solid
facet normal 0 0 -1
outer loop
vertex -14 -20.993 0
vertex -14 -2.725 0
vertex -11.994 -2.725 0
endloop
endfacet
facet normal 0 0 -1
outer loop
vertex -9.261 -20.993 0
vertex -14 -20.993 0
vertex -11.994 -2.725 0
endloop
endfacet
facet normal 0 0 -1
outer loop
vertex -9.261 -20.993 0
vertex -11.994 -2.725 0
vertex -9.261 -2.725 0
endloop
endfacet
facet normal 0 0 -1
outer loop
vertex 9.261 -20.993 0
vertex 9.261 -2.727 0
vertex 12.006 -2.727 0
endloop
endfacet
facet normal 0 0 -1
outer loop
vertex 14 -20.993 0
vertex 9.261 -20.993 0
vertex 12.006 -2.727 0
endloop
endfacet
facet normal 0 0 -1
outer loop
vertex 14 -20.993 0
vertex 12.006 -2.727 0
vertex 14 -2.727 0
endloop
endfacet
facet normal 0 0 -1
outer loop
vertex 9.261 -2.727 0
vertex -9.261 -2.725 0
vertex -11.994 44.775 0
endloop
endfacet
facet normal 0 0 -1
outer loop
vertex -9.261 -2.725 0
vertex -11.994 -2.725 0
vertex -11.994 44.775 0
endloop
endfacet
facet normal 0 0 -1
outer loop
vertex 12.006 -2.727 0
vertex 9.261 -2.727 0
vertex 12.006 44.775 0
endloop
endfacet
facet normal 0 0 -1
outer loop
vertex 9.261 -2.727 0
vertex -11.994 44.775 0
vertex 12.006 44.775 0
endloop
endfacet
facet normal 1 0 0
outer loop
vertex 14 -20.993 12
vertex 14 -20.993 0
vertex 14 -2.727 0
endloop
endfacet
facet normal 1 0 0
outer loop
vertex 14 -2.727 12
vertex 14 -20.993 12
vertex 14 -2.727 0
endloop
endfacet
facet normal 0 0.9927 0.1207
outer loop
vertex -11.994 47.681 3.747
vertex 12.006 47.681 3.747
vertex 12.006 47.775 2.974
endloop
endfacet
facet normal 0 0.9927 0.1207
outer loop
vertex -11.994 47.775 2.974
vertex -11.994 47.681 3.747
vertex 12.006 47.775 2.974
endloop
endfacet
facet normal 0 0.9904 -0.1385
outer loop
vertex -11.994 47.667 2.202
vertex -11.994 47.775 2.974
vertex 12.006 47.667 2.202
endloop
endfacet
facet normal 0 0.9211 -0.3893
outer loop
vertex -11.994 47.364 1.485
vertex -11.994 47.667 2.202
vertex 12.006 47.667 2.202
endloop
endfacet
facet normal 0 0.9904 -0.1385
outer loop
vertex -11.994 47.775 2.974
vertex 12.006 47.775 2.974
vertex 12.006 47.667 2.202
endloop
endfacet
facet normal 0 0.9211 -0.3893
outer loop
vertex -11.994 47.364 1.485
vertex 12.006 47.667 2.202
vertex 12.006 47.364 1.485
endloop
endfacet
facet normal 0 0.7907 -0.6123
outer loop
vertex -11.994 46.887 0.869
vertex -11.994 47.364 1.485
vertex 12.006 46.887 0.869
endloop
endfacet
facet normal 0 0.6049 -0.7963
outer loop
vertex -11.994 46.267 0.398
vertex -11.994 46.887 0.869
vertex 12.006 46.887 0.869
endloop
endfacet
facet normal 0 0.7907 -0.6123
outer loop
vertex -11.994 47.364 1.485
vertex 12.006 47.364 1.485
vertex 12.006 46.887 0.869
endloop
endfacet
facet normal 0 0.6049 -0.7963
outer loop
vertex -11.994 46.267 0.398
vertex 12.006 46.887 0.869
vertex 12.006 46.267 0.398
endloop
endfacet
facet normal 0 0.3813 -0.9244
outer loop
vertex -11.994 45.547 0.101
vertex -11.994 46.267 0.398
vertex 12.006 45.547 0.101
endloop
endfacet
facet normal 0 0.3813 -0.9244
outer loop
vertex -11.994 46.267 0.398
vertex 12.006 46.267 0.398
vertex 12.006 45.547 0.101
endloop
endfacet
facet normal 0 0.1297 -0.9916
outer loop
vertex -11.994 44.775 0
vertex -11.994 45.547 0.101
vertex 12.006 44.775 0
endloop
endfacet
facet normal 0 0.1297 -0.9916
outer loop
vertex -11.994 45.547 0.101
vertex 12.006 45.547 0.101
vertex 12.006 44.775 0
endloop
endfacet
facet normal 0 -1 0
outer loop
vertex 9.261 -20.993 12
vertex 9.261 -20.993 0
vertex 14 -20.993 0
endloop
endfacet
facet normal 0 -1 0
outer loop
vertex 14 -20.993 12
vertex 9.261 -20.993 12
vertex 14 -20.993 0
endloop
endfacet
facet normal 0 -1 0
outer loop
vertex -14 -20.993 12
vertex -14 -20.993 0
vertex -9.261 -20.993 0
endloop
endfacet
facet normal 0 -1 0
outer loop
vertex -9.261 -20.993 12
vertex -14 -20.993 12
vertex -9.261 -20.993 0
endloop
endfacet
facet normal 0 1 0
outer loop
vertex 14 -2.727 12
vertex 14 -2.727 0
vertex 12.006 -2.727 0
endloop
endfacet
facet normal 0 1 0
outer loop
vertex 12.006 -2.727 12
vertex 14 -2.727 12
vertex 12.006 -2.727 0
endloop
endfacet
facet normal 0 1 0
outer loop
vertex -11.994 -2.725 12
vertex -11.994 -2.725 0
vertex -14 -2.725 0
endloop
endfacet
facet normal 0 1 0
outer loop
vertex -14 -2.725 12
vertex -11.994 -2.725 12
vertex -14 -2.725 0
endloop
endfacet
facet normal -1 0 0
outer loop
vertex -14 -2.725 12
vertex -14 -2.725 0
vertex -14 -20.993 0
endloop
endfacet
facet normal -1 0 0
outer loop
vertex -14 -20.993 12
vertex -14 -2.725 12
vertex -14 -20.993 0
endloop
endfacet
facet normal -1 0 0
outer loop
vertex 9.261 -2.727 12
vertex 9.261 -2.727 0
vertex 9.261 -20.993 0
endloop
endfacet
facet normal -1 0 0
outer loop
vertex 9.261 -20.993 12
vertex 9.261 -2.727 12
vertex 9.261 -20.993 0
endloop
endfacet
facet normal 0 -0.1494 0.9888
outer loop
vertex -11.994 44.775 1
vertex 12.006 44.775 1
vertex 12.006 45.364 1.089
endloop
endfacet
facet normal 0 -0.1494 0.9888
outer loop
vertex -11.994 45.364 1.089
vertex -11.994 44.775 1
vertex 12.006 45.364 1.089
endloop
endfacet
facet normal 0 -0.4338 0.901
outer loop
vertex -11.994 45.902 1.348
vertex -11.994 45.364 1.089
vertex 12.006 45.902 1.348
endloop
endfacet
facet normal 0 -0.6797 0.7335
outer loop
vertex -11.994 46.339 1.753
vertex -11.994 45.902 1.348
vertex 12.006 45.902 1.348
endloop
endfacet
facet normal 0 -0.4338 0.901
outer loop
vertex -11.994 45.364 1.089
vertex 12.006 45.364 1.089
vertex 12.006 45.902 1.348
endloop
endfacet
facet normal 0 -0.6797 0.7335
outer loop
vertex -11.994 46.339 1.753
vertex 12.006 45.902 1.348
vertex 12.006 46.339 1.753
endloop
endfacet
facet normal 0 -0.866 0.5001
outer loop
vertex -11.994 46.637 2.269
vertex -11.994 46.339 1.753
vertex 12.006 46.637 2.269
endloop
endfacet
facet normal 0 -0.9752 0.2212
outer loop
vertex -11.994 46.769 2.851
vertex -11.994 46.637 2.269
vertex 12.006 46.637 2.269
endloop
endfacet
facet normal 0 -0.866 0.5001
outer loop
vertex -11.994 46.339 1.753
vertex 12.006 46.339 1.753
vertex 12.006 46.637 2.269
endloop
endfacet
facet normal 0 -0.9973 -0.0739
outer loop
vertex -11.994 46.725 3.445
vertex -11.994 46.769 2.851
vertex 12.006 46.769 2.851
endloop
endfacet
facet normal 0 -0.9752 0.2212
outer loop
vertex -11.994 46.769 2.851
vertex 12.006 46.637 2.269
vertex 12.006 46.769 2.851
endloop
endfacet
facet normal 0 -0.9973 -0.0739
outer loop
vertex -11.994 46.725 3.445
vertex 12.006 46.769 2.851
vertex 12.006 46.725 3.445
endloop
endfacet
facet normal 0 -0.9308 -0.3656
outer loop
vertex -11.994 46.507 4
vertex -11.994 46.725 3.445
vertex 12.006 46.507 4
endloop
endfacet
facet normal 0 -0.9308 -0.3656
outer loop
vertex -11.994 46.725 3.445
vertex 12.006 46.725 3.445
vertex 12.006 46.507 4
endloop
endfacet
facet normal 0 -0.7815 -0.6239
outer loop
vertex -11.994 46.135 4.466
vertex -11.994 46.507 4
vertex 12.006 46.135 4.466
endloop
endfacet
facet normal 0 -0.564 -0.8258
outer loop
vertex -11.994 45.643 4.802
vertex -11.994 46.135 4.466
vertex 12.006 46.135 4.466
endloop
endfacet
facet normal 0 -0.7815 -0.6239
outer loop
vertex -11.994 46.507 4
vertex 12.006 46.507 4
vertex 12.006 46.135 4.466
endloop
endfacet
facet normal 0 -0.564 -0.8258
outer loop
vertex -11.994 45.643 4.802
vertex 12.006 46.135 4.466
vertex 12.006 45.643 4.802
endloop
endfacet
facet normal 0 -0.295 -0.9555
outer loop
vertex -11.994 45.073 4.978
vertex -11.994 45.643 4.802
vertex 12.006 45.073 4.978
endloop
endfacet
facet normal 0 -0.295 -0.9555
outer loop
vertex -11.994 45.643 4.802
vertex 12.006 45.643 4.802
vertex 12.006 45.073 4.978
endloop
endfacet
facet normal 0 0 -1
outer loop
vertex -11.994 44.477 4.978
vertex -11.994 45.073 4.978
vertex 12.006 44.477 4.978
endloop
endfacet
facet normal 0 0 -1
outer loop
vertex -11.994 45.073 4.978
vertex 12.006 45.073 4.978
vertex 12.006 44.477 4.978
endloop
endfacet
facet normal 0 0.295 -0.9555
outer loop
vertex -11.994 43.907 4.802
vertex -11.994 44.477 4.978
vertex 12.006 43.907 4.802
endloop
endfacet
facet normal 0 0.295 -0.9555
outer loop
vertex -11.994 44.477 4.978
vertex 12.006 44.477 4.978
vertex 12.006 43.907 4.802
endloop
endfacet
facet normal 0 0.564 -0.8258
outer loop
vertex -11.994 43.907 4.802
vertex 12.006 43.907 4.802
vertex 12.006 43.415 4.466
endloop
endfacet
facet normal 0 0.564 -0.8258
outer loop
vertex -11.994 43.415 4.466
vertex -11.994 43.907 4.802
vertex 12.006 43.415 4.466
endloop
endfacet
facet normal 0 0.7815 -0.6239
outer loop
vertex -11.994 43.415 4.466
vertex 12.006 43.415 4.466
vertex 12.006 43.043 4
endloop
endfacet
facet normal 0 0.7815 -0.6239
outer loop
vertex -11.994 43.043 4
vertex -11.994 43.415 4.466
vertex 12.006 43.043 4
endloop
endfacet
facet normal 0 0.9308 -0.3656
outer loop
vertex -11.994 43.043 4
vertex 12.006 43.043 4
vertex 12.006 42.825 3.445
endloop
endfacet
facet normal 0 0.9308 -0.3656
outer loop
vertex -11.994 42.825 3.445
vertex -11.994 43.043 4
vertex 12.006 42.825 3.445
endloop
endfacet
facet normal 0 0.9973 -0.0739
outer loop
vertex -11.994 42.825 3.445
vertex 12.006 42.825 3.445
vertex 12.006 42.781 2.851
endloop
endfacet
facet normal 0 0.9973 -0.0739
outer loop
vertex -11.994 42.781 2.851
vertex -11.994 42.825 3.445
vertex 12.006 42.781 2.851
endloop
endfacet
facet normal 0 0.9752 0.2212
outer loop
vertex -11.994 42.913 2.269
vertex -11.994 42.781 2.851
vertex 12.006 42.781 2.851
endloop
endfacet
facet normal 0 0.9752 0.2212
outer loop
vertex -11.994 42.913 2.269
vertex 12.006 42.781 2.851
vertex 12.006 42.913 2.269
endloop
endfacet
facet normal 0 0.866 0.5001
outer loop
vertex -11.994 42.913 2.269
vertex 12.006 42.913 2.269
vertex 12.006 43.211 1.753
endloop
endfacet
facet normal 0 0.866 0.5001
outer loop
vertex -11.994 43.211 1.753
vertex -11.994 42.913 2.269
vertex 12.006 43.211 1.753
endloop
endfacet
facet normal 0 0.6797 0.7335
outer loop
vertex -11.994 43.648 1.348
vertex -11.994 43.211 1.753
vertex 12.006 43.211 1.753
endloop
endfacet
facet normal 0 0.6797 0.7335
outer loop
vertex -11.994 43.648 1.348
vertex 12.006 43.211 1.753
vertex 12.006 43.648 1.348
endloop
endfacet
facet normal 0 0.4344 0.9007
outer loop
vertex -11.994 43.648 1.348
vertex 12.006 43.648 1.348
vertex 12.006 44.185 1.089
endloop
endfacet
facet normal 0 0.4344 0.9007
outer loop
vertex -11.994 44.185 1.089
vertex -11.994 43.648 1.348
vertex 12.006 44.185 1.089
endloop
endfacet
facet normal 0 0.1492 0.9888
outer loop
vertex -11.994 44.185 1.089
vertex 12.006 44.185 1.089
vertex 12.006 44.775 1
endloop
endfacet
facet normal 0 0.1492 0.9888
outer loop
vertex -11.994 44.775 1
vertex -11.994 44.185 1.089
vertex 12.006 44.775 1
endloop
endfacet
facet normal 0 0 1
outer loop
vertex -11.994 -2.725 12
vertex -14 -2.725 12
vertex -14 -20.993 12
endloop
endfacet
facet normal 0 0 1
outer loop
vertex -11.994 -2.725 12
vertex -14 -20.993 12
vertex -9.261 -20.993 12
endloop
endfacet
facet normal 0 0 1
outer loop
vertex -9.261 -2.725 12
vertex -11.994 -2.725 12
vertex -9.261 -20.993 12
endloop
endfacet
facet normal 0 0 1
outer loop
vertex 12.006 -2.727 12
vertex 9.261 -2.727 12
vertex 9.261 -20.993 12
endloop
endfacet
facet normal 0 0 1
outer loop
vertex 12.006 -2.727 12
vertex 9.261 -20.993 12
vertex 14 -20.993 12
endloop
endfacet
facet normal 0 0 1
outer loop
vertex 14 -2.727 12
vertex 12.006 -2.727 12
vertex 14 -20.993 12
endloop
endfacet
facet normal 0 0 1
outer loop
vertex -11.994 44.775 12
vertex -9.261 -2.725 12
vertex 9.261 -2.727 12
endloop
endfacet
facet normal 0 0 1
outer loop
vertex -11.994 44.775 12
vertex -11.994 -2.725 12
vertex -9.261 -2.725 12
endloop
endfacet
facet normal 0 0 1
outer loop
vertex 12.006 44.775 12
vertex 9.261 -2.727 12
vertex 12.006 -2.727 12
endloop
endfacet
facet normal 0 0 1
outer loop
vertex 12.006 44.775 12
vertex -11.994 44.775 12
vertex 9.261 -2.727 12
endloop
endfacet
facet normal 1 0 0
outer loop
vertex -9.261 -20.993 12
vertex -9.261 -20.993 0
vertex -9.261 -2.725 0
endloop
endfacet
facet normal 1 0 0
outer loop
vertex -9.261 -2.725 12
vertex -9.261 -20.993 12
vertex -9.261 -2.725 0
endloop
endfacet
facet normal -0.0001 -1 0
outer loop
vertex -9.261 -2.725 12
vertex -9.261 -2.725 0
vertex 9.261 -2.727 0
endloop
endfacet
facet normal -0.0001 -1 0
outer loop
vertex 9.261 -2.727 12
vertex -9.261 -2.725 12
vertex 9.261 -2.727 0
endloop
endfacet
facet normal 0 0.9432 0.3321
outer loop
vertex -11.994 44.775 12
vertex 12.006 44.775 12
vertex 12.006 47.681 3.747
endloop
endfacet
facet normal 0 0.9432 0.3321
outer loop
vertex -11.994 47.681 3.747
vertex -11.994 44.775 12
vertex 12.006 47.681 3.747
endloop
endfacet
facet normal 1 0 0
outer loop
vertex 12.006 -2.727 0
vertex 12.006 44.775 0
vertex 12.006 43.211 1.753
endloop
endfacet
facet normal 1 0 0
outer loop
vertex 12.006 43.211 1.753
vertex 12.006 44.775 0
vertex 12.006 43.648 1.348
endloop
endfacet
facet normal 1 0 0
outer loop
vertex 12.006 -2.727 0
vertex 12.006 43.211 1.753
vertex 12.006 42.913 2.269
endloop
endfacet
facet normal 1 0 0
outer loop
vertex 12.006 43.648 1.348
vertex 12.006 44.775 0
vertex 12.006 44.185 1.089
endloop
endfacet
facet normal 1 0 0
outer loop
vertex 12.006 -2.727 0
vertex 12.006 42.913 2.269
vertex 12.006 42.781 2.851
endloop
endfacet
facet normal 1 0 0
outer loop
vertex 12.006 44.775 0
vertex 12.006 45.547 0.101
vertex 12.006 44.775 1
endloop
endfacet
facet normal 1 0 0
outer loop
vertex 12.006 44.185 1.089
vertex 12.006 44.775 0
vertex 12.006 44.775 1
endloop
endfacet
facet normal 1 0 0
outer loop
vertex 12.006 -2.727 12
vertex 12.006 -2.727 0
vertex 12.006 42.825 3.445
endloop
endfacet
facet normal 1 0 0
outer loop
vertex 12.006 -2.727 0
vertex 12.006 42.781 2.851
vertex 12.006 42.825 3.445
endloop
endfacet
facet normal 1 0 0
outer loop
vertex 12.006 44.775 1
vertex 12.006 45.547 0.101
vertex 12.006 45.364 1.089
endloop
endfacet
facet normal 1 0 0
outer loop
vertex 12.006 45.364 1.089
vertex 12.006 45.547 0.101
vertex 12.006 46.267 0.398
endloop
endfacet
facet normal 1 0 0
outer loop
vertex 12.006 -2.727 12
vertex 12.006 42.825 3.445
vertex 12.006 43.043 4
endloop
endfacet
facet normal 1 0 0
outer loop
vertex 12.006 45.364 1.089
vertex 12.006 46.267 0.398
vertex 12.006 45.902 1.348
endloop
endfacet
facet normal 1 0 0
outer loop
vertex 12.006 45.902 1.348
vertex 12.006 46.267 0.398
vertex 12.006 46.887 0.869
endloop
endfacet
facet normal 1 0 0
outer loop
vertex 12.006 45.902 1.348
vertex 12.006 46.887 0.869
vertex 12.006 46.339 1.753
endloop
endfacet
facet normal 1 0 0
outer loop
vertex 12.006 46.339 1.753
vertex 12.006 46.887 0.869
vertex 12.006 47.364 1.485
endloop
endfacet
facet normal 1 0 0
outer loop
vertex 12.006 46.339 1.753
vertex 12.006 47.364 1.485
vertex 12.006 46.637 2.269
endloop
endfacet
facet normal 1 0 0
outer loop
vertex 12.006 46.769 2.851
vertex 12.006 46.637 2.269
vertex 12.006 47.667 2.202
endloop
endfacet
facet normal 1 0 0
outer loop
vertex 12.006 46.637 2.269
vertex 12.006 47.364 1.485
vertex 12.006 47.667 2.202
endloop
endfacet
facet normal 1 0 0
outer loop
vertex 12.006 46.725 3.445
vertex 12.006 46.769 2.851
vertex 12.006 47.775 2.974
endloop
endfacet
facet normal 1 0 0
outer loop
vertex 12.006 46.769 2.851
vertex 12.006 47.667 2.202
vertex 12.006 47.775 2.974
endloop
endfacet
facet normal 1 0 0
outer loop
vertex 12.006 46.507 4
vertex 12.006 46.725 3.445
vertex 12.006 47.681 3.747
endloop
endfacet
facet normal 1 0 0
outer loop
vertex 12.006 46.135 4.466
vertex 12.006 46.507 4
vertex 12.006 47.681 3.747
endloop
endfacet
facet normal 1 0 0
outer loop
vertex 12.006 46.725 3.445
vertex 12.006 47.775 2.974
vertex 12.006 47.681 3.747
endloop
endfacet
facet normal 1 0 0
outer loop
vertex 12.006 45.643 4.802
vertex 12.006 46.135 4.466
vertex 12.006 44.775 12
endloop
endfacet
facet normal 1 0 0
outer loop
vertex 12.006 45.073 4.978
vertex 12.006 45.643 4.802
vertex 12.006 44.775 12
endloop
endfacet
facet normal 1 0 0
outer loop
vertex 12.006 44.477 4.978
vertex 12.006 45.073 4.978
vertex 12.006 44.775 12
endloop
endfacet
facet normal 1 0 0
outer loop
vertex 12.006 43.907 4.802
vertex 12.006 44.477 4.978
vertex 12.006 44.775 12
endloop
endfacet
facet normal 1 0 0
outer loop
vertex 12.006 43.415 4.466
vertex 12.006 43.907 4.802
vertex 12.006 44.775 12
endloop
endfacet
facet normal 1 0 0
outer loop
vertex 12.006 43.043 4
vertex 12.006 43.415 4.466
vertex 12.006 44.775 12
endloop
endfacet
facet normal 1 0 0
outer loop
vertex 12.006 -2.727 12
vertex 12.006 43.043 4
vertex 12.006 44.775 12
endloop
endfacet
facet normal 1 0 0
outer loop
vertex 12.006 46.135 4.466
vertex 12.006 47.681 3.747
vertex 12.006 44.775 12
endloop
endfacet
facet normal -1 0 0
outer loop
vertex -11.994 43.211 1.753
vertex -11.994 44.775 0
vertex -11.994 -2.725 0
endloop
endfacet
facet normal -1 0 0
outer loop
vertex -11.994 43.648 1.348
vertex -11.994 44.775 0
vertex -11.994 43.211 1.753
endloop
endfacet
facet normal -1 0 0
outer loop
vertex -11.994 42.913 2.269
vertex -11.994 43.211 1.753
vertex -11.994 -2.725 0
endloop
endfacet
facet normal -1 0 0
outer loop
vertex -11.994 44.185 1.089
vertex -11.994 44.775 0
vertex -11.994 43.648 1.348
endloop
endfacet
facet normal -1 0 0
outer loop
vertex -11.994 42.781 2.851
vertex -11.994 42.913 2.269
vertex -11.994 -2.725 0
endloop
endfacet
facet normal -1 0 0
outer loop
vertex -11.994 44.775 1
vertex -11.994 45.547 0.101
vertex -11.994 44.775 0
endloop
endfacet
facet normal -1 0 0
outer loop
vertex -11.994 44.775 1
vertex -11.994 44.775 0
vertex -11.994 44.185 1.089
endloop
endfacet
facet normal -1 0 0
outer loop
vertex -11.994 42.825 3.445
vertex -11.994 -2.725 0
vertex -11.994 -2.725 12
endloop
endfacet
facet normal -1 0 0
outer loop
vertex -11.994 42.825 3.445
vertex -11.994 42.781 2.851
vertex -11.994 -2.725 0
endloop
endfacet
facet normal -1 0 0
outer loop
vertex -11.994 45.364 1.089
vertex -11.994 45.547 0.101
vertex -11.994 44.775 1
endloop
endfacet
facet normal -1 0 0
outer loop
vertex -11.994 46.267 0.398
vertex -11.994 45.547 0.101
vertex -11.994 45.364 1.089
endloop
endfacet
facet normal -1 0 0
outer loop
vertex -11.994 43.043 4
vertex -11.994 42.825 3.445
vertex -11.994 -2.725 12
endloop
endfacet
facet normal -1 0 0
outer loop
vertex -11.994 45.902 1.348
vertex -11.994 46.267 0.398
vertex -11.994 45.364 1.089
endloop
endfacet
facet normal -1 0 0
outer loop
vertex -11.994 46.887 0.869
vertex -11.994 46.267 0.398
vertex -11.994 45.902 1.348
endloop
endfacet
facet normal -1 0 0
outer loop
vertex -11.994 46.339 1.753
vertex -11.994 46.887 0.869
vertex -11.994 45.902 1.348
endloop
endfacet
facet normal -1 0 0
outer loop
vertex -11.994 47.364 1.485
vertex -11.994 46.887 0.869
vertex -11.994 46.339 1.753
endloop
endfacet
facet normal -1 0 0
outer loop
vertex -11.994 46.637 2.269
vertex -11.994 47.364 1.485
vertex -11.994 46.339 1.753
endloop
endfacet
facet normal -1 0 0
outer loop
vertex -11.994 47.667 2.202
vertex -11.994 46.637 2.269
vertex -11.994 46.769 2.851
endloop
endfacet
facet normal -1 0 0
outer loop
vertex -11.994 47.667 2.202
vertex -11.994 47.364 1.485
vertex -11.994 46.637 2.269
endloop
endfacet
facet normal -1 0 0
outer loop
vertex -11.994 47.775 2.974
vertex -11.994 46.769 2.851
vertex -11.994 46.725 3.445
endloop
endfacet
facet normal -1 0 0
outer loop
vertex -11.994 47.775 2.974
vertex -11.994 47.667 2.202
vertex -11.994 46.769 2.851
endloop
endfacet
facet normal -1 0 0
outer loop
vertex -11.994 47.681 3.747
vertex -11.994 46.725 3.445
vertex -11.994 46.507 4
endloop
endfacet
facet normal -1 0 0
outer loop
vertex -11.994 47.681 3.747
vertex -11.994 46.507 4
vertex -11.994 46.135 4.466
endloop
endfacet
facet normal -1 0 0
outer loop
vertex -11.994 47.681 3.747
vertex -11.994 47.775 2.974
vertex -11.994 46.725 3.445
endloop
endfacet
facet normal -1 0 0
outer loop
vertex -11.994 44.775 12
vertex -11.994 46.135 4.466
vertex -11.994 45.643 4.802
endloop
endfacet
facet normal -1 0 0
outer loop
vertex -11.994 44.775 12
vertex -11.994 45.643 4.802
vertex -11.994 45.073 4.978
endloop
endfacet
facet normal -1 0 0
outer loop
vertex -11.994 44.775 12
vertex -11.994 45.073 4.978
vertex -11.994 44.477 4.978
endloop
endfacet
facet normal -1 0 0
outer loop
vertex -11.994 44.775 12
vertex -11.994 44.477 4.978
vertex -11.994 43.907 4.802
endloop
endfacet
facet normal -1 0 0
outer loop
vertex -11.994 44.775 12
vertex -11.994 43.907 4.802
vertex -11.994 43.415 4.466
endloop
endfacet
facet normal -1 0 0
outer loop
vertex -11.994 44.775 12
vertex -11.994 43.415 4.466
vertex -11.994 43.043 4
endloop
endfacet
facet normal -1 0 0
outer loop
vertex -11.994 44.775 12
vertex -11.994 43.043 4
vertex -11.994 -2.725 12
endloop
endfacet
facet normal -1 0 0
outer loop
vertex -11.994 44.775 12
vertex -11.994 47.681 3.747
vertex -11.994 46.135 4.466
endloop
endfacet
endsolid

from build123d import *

# Parameters (mm, degrees)
EXTRUDE_1_DEPTH      = 12
EXTRUDE_4_DEPTH      = 24
SKETCH_16_R          = 2
CUT_EXTRUDE_11_DEPTH = 27.005399728


with BuildPart() as part:
    # 스케치1 → 보스-돌출1 (new body)
    with BuildSketch(Plane.XY):
        Polygon((-11.994395335, 44.774969809), (-11.994395335, -2.725030191), (-13.999795062, -2.725030191), (-13.999795062, -20.993190191), (-9.261084312, -20.993190191), (-9.261084312, -2.725030191), (9.261494188, -2.727088258), (9.261494188, -20.993190191), (14.000204938, -20.993190191), (14.000204938, -2.727088258), (12.005604665, -2.727088258), (12.005604665, 44.774969809), align=None)
    extrude(amount=EXTRUDE_1_DEPTH)

    # 스케치15 → 보스-돌출4 (add)
    with BuildSketch(Plane(origin=(12.005604665, 0, 0), x_dir=(0, 0, -1), z_dir=(1, 0, 0))):
        with BuildLine():
            Line((-12, 44.774969809), (-3.746682541, 47.680561863))
            ThreePointArc((-3.746682541, 47.680561863), (-1.161528845, 47.145628749), (0, 44.774969809))
            Line((0, 44.774969809), (-12, 44.774969809))
        make_face()
    extrude(amount=-EXTRUDE_4_DEPTH)

    # 스케치16 → 컷-돌출11 (cut, through all)
    with BuildSketch(Plane(origin=(12.005604665, 0, 0), x_dir=(0, 0, -1), z_dir=(1, 0, 0))):
        with Locations((-3, 44.774969809)):
            Circle(SKETCH_16_R)
    extrude(amount=-CUT_EXTRUDE_11_DEPTH, mode=Mode.SUBTRACT)


solid = part.part
